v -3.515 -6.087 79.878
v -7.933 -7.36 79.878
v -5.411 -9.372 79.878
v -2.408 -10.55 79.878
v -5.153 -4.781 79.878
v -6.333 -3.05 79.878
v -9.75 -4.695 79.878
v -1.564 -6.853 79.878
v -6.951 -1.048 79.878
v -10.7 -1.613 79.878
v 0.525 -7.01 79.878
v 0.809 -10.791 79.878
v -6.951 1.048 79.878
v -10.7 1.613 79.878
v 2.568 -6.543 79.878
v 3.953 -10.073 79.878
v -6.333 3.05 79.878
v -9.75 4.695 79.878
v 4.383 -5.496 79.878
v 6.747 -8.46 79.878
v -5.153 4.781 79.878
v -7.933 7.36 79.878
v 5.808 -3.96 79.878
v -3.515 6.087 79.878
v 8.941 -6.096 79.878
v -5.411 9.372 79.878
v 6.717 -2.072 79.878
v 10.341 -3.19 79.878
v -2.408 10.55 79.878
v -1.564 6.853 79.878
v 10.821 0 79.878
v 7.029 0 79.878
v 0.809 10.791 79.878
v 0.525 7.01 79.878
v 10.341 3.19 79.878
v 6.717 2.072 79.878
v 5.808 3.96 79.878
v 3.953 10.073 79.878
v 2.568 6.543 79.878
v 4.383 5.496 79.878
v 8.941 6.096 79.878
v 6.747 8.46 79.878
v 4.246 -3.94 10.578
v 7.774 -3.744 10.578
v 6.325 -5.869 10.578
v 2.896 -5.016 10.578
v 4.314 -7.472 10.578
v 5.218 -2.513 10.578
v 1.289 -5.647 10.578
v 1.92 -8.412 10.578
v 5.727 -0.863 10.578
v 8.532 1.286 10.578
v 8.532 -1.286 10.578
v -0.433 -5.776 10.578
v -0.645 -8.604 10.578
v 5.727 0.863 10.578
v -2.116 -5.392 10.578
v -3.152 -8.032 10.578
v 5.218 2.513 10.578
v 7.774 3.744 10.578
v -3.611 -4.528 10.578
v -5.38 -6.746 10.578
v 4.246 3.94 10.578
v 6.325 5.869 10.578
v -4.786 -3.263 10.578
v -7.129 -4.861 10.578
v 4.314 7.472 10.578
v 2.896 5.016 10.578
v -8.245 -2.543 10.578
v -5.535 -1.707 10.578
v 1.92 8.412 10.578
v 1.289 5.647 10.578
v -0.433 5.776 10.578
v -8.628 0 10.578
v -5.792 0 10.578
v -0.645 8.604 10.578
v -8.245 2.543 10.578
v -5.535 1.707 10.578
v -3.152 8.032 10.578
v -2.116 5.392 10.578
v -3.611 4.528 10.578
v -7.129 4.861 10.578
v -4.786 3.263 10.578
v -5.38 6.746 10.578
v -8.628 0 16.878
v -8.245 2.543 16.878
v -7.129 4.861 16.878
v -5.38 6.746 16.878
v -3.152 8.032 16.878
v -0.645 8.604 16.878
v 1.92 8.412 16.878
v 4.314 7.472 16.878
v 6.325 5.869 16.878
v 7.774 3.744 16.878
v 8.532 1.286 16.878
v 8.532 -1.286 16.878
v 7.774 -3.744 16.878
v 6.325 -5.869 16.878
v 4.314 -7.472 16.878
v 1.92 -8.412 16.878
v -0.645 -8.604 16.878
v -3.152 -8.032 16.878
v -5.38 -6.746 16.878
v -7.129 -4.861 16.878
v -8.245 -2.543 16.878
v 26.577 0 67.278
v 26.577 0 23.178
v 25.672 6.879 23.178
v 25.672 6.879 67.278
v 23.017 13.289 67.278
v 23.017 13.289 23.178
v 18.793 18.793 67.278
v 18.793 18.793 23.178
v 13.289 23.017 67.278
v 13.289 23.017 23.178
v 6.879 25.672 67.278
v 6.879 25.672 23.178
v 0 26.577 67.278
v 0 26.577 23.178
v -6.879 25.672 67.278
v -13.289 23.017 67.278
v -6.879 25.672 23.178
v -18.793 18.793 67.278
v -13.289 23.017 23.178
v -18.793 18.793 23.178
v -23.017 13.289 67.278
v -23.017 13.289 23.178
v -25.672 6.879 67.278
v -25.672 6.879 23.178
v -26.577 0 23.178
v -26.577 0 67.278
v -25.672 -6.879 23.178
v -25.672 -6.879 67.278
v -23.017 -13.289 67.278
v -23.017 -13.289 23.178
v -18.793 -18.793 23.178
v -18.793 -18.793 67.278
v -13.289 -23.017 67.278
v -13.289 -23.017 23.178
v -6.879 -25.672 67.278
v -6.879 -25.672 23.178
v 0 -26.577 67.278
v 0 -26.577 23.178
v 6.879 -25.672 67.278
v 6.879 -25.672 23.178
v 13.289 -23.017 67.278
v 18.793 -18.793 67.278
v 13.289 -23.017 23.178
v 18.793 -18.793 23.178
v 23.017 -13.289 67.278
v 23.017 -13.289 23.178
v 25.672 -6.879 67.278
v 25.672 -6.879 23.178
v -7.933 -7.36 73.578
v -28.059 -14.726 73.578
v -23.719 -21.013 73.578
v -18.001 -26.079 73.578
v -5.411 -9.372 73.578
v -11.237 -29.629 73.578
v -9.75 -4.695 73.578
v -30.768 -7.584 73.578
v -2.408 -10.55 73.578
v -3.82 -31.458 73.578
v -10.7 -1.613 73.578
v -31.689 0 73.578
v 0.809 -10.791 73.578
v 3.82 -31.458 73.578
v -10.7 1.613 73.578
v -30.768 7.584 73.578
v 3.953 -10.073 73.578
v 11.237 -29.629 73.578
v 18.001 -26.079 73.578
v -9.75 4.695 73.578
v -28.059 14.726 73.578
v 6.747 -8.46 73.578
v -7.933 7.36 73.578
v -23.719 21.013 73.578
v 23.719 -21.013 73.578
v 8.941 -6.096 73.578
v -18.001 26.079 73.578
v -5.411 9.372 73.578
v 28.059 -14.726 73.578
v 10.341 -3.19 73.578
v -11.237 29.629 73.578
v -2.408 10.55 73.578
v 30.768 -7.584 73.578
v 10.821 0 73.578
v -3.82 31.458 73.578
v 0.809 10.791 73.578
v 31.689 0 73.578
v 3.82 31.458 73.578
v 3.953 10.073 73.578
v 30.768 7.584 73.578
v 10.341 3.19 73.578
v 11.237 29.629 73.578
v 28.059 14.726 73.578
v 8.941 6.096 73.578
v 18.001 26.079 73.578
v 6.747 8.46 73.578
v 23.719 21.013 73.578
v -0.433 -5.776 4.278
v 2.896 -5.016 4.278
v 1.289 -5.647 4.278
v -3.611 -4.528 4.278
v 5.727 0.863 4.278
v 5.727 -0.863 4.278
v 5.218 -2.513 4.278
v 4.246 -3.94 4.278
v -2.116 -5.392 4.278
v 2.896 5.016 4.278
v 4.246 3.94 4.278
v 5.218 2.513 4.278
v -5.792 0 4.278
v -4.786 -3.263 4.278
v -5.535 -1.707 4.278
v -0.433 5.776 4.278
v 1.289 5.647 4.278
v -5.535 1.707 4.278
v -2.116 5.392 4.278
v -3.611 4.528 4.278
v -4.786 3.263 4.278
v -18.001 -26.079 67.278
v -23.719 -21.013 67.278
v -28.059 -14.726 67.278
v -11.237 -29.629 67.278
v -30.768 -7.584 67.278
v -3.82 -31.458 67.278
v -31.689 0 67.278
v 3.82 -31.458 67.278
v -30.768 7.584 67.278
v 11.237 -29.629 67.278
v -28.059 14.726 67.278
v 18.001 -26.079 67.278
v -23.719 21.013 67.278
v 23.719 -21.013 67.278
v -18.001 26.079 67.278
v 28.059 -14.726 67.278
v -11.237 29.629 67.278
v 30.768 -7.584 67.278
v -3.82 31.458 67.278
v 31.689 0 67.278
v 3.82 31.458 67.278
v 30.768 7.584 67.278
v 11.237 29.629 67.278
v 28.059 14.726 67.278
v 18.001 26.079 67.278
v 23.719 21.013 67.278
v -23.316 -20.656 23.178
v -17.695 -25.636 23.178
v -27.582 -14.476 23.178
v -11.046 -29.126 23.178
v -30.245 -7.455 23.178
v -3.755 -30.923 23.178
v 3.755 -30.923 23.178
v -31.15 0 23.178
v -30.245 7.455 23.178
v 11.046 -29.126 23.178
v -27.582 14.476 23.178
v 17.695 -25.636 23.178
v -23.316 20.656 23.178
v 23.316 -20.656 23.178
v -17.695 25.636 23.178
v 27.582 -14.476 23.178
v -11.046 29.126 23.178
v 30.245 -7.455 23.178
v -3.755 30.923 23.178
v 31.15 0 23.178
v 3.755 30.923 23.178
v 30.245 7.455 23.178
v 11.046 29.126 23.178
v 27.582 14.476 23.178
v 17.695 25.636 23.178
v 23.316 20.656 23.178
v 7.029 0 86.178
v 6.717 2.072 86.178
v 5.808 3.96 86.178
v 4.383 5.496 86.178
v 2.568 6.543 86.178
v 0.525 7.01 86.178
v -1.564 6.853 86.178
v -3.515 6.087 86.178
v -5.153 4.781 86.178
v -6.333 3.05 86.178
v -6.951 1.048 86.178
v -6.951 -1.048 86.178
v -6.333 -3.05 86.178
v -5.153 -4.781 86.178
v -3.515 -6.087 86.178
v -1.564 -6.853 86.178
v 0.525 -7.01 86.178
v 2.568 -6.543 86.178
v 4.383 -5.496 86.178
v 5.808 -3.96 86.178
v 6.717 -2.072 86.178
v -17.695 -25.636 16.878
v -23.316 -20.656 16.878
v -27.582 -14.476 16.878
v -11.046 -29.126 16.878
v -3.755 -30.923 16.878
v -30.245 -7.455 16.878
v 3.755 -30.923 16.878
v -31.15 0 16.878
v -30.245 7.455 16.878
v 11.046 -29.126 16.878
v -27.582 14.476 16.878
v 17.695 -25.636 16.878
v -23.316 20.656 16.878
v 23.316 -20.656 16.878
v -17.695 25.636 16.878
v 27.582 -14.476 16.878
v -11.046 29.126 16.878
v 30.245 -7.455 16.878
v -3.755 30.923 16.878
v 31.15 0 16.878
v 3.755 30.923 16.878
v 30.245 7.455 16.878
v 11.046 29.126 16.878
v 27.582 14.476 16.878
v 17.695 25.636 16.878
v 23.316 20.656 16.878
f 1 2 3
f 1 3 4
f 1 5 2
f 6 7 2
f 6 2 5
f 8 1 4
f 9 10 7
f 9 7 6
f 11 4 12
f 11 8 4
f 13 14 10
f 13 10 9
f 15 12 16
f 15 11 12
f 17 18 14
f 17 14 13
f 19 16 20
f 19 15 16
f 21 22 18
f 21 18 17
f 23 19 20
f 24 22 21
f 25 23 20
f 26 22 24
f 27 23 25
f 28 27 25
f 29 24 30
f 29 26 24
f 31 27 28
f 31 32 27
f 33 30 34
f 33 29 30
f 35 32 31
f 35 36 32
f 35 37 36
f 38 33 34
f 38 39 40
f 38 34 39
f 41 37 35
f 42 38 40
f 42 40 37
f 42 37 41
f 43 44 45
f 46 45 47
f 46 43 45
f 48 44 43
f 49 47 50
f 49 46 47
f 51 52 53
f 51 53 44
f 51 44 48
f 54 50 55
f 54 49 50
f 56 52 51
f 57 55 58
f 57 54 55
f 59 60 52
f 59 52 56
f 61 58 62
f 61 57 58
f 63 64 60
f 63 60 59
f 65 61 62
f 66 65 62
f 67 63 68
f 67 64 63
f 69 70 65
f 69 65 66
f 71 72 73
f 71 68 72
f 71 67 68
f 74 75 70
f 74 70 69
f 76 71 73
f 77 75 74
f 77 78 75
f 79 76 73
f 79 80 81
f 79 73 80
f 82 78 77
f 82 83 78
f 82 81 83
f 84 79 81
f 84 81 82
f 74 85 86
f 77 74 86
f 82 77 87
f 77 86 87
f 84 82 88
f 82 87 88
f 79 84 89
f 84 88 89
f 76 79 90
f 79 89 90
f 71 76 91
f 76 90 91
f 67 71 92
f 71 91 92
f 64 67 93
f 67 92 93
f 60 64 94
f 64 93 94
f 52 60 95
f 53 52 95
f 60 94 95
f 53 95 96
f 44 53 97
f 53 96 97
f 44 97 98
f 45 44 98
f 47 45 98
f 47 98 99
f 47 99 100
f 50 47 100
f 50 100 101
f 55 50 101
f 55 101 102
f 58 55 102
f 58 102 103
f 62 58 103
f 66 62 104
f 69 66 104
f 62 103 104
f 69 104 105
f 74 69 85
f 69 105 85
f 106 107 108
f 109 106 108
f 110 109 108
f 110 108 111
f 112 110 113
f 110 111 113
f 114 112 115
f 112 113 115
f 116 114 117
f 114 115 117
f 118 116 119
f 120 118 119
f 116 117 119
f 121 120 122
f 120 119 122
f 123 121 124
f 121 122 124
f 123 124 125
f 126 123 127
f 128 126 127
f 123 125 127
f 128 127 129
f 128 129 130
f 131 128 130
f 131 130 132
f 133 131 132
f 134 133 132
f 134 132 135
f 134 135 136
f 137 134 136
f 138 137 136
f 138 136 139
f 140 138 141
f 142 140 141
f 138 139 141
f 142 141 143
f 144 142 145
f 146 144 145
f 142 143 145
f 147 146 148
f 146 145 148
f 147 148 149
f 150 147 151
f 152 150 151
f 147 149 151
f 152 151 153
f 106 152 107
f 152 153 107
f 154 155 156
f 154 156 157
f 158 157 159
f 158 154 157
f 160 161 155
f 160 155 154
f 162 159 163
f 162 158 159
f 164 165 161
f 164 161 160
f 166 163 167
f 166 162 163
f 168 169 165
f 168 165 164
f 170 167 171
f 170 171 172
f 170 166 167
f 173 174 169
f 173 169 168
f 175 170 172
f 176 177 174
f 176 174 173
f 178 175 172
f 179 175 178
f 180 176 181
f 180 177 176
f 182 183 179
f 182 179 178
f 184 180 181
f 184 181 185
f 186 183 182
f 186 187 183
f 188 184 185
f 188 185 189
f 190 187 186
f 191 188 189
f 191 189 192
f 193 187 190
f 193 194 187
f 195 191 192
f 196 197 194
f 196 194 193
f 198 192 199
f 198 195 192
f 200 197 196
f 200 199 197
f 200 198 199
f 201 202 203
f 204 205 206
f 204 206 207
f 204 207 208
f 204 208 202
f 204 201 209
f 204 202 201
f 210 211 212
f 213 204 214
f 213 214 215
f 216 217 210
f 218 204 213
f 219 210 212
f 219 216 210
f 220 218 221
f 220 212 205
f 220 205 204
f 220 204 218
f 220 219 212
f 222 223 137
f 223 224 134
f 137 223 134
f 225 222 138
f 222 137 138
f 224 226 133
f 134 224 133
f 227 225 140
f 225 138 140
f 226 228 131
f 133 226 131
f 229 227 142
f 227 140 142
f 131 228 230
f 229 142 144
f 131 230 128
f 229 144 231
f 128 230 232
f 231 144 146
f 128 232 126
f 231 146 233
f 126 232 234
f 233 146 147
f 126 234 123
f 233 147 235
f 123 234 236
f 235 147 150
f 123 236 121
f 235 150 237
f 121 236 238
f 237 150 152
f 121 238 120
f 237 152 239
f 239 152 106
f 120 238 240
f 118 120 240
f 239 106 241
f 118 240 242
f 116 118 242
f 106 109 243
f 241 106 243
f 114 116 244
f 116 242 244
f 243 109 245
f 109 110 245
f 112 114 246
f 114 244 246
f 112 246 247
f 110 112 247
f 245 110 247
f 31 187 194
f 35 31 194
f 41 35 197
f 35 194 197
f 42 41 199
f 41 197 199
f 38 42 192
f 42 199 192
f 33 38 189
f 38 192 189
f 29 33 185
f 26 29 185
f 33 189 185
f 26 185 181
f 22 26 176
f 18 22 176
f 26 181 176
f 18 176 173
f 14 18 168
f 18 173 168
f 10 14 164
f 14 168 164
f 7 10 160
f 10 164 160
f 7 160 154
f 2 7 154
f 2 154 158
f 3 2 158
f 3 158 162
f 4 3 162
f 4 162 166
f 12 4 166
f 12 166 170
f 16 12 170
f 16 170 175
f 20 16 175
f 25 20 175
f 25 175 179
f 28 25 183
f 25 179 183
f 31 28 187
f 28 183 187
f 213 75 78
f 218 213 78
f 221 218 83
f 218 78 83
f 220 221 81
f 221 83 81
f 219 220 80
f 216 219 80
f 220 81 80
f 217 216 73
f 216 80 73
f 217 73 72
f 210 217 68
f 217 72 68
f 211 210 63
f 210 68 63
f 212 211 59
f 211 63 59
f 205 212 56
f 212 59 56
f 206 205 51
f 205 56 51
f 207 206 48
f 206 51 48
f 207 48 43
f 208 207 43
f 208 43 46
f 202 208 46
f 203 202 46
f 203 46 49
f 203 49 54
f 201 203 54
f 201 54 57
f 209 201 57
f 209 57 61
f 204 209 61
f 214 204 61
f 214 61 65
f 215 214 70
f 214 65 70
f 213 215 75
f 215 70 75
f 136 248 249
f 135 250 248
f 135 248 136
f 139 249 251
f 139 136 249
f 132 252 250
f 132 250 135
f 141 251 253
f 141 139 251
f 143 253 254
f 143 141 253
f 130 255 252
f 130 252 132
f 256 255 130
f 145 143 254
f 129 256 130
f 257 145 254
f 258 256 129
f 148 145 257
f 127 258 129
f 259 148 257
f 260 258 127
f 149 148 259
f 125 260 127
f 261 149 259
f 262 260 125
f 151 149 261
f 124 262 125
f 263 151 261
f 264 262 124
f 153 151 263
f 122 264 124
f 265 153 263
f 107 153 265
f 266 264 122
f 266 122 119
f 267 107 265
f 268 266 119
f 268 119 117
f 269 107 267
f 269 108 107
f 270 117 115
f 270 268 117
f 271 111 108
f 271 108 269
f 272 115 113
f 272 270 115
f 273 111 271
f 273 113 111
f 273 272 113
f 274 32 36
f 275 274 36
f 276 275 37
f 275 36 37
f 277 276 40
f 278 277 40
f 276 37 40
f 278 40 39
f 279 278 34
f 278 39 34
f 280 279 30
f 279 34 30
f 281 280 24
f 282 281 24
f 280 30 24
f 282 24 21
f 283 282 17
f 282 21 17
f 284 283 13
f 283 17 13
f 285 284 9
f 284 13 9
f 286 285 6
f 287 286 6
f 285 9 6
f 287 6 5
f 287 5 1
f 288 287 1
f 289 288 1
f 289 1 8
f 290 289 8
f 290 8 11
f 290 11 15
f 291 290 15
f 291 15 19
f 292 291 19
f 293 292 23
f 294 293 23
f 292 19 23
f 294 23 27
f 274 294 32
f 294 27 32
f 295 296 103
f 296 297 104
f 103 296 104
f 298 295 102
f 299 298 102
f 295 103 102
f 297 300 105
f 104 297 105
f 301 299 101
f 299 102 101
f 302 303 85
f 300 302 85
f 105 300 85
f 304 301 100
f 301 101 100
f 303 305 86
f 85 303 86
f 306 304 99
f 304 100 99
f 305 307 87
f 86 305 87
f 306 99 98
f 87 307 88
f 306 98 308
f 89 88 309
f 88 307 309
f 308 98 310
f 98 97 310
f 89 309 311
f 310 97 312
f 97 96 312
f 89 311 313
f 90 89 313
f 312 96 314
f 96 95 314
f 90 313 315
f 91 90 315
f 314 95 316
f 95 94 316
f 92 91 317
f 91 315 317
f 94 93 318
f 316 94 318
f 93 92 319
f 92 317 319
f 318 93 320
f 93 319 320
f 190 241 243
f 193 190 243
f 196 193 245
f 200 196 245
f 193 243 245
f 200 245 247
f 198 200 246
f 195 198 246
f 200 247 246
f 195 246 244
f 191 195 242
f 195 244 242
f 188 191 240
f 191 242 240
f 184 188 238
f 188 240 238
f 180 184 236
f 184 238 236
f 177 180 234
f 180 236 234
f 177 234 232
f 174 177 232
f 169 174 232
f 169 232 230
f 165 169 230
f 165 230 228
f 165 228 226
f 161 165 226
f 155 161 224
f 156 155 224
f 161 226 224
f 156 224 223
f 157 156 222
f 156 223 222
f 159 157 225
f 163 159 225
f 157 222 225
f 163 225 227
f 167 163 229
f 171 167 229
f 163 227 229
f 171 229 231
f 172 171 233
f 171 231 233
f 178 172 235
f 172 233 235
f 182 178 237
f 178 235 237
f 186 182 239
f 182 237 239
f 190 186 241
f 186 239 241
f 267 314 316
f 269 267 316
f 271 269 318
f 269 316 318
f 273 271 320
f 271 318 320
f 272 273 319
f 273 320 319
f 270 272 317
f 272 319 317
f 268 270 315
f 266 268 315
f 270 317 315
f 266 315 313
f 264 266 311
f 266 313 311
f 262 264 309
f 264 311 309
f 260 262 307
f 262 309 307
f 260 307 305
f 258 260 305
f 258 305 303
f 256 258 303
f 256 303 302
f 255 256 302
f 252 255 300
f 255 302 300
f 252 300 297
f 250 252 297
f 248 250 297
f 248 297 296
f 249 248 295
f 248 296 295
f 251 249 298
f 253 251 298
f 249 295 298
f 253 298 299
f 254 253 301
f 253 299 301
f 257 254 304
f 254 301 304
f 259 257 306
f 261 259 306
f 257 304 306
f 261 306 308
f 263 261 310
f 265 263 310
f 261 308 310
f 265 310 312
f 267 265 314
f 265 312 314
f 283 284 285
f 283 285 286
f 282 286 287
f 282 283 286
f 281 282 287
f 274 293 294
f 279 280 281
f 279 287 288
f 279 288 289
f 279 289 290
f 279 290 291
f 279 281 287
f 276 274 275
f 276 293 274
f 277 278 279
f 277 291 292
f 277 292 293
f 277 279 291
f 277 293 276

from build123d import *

# Parameters (mm, degrees)
SKETCH1_R           = 49.444265543
BOSS_EXTRUDE1_DEPTH = 10
SKETCH4_R           = 42.186355854
BOSS_EXTRUDE2_DEPTH = 70
SKETCH5_R           = 50.299469204
BOSS_EXTRUDE3_DEPTH = 10
SKETCH6_R           = 13.695749192
BOSS_EXTRUDE4_DEPTH = 10
SKETCH7_R           = 9.193746995
BOSS_EXTRUDE5_DEPTH = 10
SKETCH8_R           = 17.176734278
BOSS_EXTRUDE6_DEPTH = 10
SKETCH9_R           = 11.157494919
BOSS_EXTRUDE7_DEPTH = 10
SCALE1_SCALE        = 0.9
SCALE2_SCALE        = 0.7


with BuildPart() as part:
    # Sketch1 → Boss-Extrude1 (new body)
    with BuildSketch(Plane.XY):
        Circle(SKETCH1_R)
    extrude(amount=BOSS_EXTRUDE1_DEPTH)

    # Sketch4 → Boss-Extrude2 (add)
    with BuildSketch(Plane.XY.offset(10)):
        Circle(SKETCH4_R)
    extrude(amount=BOSS_EXTRUDE2_DEPTH)

    # Sketch5 → Boss-Extrude3 (add)
    with BuildSketch(Plane.XY.offset(80)):
        Circle(SKETCH5_R)
    extrude(amount=BOSS_EXTRUDE3_DEPTH)

    # Sketch6 → Boss-Extrude4 (add)
    with BuildSketch(Plane(origin=(0, 0, 0), x_dir=(-1, 0, 0), z_dir=(0, 0, -1))):
        Circle(SKETCH6_R)
    extrude(amount=BOSS_EXTRUDE4_DEPTH)

    # Sketch7 → Boss-Extrude5 (add)
    with BuildSketch(Plane(origin=(0, 0, -10), x_dir=(-1, 0, 0), z_dir=(0, 0, -1))):
        Circle(SKETCH7_R)
    extrude(amount=BOSS_EXTRUDE5_DEPTH)

    # Sketch8 → Boss-Extrude6 (add)
    with BuildSketch(Plane.XY.offset(90)):
        Circle(SKETCH8_R)
    extrude(amount=BOSS_EXTRUDE6_DEPTH)

    # Sketch9 → Boss-Extrude7 (add)
    with BuildSketch(Plane.XY.offset(100)):
        Circle(SKETCH9_R)
    extrude(amount=BOSS_EXTRUDE7_DEPTH)


with BuildPart() as part_1:
    # Scale1: scaled about (0, 0, 45.617034172)
    add(part.part.scale(SCALE1_SCALE).moved(Location((0, 0, 4.561703417))))


with BuildPart() as part_2:
    # Scale2: scaled about (0, 0, 45.617034172)
    add(part_1.part.scale(SCALE2_SCALE).moved(Location((0, 0, 13.685110252))))


solid = part_2.part
